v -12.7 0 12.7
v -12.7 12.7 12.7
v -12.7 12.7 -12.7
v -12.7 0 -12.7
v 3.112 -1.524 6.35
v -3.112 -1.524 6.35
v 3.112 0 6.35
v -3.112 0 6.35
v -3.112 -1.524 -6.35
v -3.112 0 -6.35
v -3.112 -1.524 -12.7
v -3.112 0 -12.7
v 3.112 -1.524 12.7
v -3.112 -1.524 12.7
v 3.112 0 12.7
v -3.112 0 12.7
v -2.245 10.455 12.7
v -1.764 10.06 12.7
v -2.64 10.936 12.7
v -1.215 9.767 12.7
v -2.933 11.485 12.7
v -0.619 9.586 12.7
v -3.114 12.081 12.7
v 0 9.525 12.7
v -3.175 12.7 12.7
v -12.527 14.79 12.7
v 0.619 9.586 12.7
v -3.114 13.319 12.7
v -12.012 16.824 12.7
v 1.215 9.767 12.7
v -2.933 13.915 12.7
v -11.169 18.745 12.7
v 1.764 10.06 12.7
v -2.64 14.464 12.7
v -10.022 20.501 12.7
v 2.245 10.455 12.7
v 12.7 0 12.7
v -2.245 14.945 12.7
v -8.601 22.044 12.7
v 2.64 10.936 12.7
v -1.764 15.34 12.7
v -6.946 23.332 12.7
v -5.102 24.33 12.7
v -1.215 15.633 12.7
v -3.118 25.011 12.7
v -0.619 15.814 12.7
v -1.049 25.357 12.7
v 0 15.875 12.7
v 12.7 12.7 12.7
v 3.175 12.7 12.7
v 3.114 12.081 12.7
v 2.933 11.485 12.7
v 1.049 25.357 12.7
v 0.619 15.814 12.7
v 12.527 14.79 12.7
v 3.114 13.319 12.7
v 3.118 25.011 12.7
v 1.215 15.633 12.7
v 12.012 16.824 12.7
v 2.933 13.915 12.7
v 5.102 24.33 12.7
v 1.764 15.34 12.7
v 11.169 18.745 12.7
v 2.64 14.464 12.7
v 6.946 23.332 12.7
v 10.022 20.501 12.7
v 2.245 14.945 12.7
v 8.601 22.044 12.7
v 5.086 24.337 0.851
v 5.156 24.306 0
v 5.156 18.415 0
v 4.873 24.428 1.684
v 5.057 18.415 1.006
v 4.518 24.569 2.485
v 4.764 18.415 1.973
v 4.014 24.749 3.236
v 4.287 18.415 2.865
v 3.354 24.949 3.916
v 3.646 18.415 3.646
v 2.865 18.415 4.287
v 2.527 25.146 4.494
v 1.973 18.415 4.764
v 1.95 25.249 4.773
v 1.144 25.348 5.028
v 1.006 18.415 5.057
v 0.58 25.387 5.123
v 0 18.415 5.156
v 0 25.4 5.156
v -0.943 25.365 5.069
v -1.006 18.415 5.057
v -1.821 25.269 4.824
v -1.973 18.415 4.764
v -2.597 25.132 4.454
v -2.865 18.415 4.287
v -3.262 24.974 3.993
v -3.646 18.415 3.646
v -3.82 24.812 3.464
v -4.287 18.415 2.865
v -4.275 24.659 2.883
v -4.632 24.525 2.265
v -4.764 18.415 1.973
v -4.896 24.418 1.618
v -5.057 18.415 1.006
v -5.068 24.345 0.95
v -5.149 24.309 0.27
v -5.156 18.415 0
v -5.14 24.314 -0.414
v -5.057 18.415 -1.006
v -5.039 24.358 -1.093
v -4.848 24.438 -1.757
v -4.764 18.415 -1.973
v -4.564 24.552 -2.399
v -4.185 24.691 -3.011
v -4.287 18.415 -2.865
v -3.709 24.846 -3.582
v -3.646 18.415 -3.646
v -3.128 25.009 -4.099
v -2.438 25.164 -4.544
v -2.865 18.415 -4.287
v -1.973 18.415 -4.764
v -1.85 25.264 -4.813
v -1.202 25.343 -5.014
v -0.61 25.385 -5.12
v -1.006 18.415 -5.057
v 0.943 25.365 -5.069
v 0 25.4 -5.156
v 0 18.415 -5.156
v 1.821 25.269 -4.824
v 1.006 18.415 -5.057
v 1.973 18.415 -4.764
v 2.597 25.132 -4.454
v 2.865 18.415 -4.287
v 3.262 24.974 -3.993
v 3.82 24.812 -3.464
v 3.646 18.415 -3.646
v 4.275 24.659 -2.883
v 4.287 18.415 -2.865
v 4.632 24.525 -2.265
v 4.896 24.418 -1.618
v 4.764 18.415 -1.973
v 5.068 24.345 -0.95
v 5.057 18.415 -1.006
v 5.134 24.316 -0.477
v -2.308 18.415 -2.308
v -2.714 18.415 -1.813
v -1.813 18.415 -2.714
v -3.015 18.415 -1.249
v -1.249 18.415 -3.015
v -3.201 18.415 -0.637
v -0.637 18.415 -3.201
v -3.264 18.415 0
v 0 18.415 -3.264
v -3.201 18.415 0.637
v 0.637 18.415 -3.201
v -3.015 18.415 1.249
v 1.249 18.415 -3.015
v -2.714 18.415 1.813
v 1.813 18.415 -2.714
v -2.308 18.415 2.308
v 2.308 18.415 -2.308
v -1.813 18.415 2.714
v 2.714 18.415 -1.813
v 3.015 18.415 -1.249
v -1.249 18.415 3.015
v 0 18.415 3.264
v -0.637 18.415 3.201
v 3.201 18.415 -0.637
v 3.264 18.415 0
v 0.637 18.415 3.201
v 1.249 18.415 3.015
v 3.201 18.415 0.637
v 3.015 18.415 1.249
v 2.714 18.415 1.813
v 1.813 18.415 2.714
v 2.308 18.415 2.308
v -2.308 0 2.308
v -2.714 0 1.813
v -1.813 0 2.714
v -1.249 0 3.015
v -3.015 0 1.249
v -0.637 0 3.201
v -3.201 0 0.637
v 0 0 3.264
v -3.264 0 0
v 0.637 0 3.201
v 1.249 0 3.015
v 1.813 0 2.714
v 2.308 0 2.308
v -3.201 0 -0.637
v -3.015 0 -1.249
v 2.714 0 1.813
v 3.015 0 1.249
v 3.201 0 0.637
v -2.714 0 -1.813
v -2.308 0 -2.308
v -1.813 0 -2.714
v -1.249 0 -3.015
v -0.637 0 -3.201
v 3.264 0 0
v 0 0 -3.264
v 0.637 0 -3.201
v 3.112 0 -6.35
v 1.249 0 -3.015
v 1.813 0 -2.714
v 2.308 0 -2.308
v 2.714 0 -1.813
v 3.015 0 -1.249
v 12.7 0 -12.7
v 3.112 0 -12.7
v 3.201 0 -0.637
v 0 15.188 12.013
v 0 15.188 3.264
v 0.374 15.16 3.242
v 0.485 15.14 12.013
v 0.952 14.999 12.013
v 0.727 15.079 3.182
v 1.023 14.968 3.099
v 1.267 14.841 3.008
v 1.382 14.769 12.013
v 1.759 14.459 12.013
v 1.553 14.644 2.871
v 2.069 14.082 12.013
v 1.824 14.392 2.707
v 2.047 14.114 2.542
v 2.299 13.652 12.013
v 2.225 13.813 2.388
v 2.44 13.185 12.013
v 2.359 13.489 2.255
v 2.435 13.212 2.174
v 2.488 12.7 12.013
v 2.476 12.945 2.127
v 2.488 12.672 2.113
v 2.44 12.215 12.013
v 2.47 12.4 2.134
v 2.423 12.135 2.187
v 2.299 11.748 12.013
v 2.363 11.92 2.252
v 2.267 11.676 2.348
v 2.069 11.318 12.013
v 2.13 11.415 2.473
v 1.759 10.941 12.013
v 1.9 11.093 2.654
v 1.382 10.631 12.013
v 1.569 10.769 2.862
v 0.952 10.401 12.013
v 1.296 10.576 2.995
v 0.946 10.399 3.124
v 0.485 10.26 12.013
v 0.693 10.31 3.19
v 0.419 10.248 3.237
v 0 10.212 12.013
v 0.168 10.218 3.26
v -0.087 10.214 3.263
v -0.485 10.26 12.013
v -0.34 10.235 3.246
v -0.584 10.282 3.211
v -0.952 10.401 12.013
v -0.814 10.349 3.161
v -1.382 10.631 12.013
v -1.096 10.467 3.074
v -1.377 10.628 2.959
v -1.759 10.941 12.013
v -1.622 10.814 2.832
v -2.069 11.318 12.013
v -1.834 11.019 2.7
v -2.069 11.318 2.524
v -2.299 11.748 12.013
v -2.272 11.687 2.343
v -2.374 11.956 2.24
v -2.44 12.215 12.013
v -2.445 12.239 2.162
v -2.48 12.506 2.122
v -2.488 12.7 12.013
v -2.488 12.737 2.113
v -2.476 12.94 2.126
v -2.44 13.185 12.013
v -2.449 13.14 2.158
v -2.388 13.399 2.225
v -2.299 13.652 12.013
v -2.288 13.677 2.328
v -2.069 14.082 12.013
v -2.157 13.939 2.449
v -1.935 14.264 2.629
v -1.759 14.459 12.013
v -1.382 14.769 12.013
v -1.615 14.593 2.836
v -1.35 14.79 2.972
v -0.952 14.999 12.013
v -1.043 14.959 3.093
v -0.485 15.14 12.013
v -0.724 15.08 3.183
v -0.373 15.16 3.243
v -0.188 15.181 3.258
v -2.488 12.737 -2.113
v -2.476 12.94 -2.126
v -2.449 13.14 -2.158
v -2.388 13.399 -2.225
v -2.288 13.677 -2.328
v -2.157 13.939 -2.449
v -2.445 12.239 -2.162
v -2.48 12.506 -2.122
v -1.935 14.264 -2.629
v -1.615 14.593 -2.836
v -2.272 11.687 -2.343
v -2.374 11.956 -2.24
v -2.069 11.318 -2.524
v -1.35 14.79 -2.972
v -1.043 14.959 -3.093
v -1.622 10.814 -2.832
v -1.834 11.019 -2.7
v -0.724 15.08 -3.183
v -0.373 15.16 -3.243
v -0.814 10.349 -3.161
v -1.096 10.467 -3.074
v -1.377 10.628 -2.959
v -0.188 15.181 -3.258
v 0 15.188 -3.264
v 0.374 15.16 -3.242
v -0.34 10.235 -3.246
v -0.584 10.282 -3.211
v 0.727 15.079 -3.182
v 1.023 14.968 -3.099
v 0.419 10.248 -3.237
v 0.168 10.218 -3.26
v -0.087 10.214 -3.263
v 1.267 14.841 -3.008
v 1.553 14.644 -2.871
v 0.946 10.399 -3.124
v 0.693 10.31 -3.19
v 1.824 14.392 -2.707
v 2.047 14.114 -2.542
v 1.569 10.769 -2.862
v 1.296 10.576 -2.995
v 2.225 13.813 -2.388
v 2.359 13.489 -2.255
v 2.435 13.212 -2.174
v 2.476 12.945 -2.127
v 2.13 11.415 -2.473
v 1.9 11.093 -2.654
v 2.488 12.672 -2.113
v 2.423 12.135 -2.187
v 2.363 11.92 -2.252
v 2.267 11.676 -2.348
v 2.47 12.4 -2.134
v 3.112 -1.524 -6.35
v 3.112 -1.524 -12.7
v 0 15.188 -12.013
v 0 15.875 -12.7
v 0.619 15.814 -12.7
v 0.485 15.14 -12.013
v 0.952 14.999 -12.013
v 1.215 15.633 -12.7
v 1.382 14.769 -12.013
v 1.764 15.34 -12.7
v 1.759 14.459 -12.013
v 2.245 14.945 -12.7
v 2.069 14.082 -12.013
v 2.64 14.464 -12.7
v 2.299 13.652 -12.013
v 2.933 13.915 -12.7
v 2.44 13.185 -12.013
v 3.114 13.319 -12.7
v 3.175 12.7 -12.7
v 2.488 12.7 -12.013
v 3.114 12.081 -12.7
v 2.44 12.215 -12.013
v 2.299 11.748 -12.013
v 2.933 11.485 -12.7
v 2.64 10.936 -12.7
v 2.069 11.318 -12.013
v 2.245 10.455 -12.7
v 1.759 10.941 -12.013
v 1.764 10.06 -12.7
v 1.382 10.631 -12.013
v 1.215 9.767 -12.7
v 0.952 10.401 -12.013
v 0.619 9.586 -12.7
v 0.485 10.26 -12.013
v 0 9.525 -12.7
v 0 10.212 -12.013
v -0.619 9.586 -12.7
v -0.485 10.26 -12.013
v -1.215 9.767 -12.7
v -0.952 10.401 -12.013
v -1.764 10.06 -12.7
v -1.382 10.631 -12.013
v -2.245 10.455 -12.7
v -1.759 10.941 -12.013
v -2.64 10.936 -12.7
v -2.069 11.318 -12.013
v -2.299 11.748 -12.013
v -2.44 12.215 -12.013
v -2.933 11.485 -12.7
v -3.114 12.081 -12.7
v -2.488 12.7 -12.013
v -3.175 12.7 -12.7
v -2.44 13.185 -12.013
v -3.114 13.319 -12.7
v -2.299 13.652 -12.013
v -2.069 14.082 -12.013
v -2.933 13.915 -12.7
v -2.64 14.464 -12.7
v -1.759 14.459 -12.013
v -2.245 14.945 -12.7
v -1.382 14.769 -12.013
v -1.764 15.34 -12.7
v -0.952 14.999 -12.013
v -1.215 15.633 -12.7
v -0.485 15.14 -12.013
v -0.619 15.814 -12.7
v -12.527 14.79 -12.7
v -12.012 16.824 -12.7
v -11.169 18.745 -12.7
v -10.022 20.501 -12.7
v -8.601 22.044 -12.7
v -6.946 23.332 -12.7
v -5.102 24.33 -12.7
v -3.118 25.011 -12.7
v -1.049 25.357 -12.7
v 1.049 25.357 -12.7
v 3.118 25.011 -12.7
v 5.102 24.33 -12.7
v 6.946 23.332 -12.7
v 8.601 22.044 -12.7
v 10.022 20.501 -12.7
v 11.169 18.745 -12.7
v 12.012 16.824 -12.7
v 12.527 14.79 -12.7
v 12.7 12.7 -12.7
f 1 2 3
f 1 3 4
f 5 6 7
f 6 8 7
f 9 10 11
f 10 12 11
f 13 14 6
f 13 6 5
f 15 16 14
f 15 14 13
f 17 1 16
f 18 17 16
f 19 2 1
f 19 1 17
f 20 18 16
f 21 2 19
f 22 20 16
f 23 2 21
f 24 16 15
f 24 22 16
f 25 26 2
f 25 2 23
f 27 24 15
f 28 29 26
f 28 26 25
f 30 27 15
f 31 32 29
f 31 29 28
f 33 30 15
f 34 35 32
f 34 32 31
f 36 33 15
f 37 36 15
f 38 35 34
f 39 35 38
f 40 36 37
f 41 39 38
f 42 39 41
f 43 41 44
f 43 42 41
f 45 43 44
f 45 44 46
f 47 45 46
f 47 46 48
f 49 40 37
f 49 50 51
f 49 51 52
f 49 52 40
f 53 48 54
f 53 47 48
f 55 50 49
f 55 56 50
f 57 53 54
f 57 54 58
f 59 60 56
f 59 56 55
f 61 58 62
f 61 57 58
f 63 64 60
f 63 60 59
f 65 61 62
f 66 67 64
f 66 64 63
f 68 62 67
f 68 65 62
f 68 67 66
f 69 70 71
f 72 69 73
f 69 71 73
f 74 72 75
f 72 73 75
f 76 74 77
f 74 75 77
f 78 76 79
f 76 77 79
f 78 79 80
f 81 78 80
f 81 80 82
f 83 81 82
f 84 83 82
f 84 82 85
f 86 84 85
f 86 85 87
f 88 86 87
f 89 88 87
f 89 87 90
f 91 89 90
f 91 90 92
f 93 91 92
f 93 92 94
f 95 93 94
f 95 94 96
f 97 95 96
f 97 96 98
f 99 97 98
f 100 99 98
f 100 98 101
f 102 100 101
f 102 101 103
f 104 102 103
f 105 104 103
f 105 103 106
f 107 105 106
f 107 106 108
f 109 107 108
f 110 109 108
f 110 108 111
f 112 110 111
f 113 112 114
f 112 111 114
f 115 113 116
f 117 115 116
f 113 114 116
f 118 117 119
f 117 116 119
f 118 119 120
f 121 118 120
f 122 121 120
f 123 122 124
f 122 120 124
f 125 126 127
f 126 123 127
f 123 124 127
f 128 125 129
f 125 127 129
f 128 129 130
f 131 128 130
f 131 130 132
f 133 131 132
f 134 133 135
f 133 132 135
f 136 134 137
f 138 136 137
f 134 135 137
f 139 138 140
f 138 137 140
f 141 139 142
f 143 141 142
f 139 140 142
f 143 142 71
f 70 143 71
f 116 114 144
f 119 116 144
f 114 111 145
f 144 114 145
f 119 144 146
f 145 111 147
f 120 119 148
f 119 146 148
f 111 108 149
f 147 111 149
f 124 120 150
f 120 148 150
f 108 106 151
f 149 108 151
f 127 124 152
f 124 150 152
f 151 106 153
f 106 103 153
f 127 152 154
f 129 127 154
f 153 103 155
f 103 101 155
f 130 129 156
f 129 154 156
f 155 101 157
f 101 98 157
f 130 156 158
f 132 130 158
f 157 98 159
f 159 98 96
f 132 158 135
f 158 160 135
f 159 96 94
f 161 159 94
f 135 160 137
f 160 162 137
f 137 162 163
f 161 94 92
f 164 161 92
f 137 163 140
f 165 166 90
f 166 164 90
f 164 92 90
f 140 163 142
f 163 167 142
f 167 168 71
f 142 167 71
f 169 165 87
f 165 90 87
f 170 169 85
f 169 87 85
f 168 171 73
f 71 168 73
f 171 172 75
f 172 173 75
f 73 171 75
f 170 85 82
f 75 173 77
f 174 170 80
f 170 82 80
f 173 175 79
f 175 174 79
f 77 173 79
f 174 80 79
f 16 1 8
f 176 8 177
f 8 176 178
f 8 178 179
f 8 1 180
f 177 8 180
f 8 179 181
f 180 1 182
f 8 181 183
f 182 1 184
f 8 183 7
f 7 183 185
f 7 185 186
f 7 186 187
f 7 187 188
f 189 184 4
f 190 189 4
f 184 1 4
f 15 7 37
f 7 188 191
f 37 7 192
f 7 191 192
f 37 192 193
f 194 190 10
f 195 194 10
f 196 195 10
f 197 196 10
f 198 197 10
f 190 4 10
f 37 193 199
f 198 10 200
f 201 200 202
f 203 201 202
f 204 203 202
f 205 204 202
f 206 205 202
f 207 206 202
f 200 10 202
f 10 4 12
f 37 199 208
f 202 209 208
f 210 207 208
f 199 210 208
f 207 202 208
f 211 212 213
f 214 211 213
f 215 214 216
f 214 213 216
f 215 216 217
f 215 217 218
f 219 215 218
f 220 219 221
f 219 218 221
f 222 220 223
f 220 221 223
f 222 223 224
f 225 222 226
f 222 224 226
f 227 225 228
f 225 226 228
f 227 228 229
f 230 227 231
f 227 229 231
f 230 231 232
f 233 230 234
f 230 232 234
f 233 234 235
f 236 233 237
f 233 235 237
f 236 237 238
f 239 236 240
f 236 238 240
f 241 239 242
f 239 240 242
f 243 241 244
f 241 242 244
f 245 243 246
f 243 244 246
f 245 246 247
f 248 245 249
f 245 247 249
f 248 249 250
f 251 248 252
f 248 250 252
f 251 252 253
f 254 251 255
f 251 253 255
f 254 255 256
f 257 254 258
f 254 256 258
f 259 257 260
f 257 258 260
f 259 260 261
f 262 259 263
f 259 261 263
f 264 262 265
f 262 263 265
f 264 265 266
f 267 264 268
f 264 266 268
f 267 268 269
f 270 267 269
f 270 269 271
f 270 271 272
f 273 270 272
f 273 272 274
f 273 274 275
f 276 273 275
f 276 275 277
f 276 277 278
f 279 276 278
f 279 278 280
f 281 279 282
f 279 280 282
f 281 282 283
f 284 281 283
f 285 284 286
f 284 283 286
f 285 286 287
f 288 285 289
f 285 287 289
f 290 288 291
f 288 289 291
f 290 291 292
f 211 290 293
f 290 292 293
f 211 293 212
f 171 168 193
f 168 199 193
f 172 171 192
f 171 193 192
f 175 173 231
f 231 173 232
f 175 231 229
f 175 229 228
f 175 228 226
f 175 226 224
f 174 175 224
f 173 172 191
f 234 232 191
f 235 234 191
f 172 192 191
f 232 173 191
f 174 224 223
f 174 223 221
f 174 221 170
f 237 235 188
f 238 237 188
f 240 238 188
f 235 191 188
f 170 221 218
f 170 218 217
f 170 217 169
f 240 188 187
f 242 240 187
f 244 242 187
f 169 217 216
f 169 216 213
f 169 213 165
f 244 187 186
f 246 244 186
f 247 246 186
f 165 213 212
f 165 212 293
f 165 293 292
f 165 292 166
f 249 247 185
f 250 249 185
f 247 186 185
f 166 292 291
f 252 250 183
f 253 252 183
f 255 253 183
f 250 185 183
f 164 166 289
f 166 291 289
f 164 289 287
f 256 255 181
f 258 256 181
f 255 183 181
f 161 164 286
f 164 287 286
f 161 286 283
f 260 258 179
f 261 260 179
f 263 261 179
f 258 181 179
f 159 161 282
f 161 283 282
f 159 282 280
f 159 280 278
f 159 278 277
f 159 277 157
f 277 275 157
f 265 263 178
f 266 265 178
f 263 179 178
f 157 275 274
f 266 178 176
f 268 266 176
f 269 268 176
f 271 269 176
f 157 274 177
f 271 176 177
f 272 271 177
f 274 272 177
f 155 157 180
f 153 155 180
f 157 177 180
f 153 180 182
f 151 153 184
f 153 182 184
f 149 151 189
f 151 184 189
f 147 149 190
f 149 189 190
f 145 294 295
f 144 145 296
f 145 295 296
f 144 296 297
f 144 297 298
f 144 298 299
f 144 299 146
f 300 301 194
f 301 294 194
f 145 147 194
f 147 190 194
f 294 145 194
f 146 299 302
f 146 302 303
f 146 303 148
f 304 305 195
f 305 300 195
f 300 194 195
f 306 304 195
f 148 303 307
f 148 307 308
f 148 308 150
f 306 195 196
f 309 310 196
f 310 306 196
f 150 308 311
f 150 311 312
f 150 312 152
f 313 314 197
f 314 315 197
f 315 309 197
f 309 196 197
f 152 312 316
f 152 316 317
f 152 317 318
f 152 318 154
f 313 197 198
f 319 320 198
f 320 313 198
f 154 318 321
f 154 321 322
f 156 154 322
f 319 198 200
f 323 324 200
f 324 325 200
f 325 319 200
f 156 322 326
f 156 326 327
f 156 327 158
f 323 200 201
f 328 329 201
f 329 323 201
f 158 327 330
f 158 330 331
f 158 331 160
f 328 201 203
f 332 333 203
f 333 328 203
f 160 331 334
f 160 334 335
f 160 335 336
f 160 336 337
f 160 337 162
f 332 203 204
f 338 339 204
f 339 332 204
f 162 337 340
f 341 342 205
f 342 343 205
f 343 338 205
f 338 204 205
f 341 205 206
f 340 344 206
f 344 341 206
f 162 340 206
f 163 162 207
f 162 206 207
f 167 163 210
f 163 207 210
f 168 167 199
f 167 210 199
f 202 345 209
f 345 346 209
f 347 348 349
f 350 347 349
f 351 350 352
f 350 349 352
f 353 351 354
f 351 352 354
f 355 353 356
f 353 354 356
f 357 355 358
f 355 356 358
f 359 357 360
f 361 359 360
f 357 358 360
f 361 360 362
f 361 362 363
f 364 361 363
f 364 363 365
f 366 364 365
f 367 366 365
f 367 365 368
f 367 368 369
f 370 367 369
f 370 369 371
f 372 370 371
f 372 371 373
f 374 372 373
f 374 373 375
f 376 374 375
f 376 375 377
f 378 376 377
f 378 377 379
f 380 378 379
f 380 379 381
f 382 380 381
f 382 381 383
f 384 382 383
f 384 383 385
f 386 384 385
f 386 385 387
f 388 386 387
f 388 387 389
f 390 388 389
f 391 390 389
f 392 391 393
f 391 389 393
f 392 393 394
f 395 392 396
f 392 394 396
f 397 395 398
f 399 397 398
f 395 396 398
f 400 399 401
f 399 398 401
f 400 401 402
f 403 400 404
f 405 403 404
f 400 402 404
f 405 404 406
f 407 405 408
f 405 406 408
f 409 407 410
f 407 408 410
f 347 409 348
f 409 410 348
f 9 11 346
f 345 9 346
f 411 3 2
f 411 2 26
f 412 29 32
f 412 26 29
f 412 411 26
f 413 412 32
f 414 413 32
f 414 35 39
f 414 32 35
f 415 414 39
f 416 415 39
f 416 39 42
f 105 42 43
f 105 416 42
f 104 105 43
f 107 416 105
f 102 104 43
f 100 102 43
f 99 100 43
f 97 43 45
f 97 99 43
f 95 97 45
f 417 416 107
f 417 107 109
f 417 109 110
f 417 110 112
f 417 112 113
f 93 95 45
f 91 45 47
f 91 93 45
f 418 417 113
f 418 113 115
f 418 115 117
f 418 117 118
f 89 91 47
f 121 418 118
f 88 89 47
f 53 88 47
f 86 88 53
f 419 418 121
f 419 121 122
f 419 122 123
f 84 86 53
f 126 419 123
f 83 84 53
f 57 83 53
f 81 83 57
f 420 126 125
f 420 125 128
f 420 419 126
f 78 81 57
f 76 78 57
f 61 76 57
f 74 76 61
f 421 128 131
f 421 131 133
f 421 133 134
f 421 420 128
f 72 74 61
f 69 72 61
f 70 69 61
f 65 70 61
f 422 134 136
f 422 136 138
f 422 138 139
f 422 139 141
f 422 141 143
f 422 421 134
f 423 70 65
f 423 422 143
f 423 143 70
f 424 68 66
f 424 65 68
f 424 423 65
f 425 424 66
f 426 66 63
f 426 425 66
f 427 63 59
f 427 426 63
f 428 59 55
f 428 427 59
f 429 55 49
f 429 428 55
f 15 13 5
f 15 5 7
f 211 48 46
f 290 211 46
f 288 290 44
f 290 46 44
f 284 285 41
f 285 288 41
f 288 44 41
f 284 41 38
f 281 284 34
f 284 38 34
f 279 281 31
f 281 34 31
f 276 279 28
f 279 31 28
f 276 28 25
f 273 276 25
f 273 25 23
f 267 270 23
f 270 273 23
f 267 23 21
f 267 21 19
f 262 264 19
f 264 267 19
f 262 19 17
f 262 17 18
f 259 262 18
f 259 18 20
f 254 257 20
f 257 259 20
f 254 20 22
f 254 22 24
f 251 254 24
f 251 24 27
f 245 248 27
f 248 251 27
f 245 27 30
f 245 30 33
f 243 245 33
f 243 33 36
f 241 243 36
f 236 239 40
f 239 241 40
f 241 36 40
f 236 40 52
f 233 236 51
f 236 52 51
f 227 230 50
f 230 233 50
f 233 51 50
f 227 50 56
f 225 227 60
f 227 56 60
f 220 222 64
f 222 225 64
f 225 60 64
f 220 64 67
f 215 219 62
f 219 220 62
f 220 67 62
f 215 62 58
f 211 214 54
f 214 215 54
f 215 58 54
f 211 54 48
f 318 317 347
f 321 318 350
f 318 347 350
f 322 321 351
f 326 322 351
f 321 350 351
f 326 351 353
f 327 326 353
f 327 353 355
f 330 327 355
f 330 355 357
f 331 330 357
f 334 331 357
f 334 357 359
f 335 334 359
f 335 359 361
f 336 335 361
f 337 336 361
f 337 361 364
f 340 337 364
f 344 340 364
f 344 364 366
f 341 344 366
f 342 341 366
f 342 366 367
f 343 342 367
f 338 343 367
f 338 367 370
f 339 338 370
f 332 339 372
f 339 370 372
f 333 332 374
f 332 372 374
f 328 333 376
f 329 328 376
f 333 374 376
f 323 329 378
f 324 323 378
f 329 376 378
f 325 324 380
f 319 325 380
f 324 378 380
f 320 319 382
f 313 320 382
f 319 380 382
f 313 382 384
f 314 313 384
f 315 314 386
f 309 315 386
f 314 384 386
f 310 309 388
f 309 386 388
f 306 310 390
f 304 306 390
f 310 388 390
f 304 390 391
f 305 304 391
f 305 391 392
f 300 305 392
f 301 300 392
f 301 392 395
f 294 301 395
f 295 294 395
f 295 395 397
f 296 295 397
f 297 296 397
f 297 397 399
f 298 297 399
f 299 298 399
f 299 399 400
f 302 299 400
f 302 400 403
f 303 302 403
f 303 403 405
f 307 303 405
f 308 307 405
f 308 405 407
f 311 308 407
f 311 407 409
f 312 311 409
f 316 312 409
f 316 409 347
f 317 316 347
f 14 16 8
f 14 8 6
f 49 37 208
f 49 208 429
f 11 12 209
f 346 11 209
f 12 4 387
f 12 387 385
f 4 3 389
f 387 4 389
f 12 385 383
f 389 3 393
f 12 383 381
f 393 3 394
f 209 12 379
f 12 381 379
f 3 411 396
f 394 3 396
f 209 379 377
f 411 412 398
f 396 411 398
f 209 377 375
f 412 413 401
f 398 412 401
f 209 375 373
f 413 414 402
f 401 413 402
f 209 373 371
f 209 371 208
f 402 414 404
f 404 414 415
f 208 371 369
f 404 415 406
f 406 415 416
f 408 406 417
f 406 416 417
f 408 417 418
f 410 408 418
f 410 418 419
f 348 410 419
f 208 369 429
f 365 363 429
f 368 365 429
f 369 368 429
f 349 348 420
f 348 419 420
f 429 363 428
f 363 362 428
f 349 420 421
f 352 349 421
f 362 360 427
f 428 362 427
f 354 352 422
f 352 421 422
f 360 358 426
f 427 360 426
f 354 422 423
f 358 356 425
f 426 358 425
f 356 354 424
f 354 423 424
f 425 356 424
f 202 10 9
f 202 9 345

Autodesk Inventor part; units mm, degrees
sketch "Sketch_1" plane through (0, 0, 0) normal (0, 0, 1) x (1, 0, 0)
  line L0 (-12.7, 0) -> (12.7, 0)
  line L1 (12.7, 0) -> (12.7, 12.7)
  arc A0 (12.7, 12.7) -> (-12.7, 12.7) centre (0, 12.7) ccw
  line L2 (-12.7, 12.7) -> (-12.7, 0)
extrude "Extrusion1" add sketch "Sketch_1" along normal mid plane 25.4
sketch "Sketch_7" plane through (0, 0, 12.7) normal (0, 0, 1) x (1, 0, 0)
  line L0 (-3.1115, -1.524) -> (3.1115, -1.524)
  line L1 (3.1115, -1.524) -> (3.1115, 0)
  line L2 (3.1115, 0) -> (-3.1115, 0)
  line L3 (-3.1115, 0) -> (-3.1115, -1.524)
extrude "Extrusion2" add sketch "Sketch_7" against normal blind 6.35
sketch "Sketch_2" plane through (0, 0, -12.7) normal (0, 0, 1) x (1, 0, 0)
  line L0 (-3.1115, -1.524) -> (3.1115, -1.524)
  line L1 (3.1115, -1.524) -> (3.1115, 0)
  line L2 (3.1115, 0) -> (-3.1115, 0)
  line L3 (-3.1115, 0) -> (-3.1115, -1.524)
extrude "Extrusion3" add sketch "Sketch_2" along normal blind 6.35
sketch "Sketch_3" plane through (0, 0, 0) normal (1, 0, 0) x (0, 1, 0)
  line L0 (12.7, -12.7) -> (12.7, 12.7)
  line L1 (12.7, 12.7) -> (15.875, 12.7)
  line L2 (15.875, 12.7) -> (15.1879, 12.0129)
  line L3 (15.1879, 12.0129) -> (15.1879, -12.0129)
  line L4 (15.1879, -12.0129) -> (15.875, -12.7)
  line L5 (15.875, -12.7) -> (12.7, -12.7)
  line L6 (12.7, -12.7) -> (12.7, 12.7)
revolve "Revolution1" cut sketch "Sketch_3" angle 360 about axis through (0, 12.7, -12.7) along (0, 0, -1)
thread "Thread1" size "1/4-20 UNC" class "2B" standard "ANSI Unified Screw Threads" full length
sketch "Sketch_4" plane through (0, 0, 0) normal (0, 0, 1) x (1, 0, 0)
  line L0 (0, 0) -> (0, 25.4)
  line L1 (0, 25.4) -> (5.1562, 25.4)
  line L2 (5.1562, 25.4) -> (5.1562, 18.415)
  line L3 (5.1562, 18.415) -> (3.2639, 18.415)
  line L4 (3.2639, 18.415) -> (3.2639, 0)
  line L5 (3.2639, 0) -> (0, 0)
  line L6 (0, 0) -> (0, 25.4)
revolve "Revolution2" cut sketch "Sketch_4" angle 360 about axis through (0, 0, 0) along (0, -1, 0)
ref_plane "nub_XY" through (0, 12.7, 12.7) normal (0, 0, 1) x (1, 0, 0)
ref_plane "nub_YZ" through (0, 12.7, 12.7) normal (1, 0, 0) x (0, 1, 0)
ref_plane "nub_ZX" through (0, 12.7, 12.7) normal (0, 1, 0) x (0, 0, 1)
ref_plane "nub1_XY" through (0, 12.7, -12.7) normal (0, 0, 1) x (1, 0, 0)
ref_plane "nub1_YZ" through (0, 12.7, -12.7) normal (1, 0, 0) x (0, 1, 0)
ref_plane "nub1_ZX" through (0, 12.7, -12.7) normal (0, 1, 0) x (0, 0, 1)
ref_plane "to_dummy_XY" through (0, 0, 0) normal (0, 1, 0) x (1, 0, 0)
ref_plane "to_dummy_YZ" through (0, 0, 0) normal (1, 0, 0) x (0, 0, -1)
ref_plane "to_dummy_ZX" through (0, 0, 0) normal (0, 0, -1) x (0, 1, 0)
ref_plane "to_screw_XY" through (0, 18.415, 0) normal (0, 1, 0) x (1, 0, 0)
ref_plane "to_screw_YZ" through (0, 18.415, 0) normal (1, 0, 0) x (0, 0, -1)
ref_plane "to_screw_ZX" through (0, 18.415, 0) normal (0, 0, -1) x (0, 1, 0)
properties part number "4188_n"
